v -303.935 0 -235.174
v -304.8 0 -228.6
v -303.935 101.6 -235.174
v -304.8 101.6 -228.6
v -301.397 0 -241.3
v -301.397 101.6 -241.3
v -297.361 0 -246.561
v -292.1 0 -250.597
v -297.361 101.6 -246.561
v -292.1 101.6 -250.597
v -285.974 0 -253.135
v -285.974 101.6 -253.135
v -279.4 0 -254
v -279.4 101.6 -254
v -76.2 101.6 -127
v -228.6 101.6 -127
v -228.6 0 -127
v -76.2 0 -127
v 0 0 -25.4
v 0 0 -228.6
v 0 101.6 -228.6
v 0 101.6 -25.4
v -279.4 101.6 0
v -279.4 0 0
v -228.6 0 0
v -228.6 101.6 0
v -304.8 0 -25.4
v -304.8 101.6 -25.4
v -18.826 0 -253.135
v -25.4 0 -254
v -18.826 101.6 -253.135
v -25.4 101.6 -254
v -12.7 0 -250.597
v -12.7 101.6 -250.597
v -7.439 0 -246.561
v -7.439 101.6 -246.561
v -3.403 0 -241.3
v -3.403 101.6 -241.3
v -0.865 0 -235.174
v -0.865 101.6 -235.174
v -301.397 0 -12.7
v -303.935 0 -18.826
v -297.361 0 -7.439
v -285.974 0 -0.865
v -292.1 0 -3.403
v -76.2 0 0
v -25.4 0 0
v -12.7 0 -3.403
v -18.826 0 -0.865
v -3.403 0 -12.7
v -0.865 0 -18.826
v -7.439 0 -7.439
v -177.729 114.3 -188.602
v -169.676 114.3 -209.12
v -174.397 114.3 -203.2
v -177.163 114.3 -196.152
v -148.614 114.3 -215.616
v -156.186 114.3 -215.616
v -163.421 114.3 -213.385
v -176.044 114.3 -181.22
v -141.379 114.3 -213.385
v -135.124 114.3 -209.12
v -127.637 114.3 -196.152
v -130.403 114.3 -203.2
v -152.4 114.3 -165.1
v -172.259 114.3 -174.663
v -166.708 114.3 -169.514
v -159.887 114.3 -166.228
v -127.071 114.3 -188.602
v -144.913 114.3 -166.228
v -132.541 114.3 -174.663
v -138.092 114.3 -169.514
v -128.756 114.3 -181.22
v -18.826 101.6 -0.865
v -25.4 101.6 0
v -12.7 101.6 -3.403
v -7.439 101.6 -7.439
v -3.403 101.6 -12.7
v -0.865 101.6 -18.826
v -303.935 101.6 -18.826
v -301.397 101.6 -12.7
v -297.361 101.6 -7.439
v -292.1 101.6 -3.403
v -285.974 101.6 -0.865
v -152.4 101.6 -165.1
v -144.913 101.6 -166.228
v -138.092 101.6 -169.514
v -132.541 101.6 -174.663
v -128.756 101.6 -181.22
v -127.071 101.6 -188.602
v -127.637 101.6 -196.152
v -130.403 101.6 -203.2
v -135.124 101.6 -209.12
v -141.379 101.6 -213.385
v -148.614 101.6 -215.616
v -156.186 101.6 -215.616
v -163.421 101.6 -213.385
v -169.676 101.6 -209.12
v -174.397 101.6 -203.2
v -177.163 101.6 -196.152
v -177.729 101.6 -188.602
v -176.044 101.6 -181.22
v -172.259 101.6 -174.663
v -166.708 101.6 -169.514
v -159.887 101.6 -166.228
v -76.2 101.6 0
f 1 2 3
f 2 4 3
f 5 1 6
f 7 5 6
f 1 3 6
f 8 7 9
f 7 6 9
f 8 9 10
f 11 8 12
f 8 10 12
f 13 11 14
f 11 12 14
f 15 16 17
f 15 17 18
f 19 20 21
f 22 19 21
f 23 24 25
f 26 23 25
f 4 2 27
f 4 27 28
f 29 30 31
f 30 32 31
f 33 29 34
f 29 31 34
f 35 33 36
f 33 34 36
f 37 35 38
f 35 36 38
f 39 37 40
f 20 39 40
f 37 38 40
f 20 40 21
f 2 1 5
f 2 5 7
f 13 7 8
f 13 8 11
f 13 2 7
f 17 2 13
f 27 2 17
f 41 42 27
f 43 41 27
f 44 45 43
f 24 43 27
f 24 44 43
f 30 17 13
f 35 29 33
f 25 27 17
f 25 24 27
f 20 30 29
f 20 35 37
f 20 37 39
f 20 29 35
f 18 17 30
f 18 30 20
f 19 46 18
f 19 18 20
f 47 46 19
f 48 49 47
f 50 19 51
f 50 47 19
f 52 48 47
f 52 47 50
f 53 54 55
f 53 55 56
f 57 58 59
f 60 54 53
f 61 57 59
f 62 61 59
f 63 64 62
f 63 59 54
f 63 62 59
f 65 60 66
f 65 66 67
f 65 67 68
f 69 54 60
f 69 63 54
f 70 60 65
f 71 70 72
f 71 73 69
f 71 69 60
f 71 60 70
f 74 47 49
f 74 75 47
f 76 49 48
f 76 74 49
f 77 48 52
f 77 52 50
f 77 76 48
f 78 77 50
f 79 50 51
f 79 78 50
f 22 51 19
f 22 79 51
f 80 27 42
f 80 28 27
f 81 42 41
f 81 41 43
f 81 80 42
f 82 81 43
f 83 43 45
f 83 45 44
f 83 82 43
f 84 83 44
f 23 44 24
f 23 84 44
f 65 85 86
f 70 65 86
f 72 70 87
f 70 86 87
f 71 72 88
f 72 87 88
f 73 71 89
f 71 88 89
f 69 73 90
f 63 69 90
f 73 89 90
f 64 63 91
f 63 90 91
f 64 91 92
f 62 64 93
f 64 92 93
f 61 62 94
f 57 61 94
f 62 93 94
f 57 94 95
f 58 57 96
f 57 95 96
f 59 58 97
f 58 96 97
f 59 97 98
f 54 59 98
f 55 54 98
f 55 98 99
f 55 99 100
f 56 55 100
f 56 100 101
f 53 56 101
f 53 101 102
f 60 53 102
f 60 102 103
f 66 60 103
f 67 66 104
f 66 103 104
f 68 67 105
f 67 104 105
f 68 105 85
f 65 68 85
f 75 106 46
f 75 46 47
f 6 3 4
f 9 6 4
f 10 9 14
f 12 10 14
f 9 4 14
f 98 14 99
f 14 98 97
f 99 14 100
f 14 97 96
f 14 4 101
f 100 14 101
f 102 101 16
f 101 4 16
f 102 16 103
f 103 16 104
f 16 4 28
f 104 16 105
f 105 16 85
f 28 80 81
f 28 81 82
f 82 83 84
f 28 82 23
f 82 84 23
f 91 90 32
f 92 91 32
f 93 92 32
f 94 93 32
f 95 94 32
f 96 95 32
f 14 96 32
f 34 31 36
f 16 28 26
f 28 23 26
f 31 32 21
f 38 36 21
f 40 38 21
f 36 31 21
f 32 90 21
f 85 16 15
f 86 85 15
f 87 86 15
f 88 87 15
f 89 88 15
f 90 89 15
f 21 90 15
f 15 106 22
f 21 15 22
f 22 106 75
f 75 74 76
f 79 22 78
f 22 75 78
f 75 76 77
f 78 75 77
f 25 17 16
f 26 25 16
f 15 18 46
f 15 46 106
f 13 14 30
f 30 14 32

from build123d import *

# Parameters (mm, degrees)
SKETCH1_W           = 304.8
SKETCH1_H           = 101.6
BOSS_EXTRUDE1_DEPTH = 254
SKETCH3_W           = 152.4
SKETCH3_H           = 101.6
CUT_EXTRUDE1_DEPTH  = 127
FILLET1_R           = 25.4
SKETCH4_R           = 25.4
BOSS_EXTRUDE2_DEPTH = 12.7


with BuildPart() as part:
    # Sketch1 → Boss-Extrude1 (new body)
    with BuildSketch(Plane.XY):
        with Locations((-152.4, 50.8)):
            Rectangle(SKETCH1_W, SKETCH1_H)
    extrude(amount=-BOSS_EXTRUDE1_DEPTH)

    # Sketch3 → Cut-Extrude1 (cut)
    with BuildSketch(Plane.XY):
        with Locations((-152.4, 50.8)):
            Rectangle(SKETCH3_W, SKETCH3_H)
    extrude(amount=-CUT_EXTRUDE1_DEPTH, mode=Mode.SUBTRACT)

    # Fillet1
    fillet1_edges = [part.edges().sort_by_distance(p)[0] for p in [
        (0, 50.8, -254),
        (0, 50.8, 0),
        (-304.8, 50.8, 0),
        (-304.8, 50.8, -254),
    ]]
    fillet(fillet1_edges, radius=FILLET1_R)

    # Sketch4 → Boss-Extrude2 (add)
    with BuildSketch(Plane(origin=(0, 101.6, 0), x_dir=(1, 0, 0), z_dir=(0, 1, 0))):
        with Locations(Location((-152.4, 190.5, 0), (0, 0, 270))):
            Circle(SKETCH4_R)
    extrude(amount=BOSS_EXTRUDE2_DEPTH)


solid = part.part
